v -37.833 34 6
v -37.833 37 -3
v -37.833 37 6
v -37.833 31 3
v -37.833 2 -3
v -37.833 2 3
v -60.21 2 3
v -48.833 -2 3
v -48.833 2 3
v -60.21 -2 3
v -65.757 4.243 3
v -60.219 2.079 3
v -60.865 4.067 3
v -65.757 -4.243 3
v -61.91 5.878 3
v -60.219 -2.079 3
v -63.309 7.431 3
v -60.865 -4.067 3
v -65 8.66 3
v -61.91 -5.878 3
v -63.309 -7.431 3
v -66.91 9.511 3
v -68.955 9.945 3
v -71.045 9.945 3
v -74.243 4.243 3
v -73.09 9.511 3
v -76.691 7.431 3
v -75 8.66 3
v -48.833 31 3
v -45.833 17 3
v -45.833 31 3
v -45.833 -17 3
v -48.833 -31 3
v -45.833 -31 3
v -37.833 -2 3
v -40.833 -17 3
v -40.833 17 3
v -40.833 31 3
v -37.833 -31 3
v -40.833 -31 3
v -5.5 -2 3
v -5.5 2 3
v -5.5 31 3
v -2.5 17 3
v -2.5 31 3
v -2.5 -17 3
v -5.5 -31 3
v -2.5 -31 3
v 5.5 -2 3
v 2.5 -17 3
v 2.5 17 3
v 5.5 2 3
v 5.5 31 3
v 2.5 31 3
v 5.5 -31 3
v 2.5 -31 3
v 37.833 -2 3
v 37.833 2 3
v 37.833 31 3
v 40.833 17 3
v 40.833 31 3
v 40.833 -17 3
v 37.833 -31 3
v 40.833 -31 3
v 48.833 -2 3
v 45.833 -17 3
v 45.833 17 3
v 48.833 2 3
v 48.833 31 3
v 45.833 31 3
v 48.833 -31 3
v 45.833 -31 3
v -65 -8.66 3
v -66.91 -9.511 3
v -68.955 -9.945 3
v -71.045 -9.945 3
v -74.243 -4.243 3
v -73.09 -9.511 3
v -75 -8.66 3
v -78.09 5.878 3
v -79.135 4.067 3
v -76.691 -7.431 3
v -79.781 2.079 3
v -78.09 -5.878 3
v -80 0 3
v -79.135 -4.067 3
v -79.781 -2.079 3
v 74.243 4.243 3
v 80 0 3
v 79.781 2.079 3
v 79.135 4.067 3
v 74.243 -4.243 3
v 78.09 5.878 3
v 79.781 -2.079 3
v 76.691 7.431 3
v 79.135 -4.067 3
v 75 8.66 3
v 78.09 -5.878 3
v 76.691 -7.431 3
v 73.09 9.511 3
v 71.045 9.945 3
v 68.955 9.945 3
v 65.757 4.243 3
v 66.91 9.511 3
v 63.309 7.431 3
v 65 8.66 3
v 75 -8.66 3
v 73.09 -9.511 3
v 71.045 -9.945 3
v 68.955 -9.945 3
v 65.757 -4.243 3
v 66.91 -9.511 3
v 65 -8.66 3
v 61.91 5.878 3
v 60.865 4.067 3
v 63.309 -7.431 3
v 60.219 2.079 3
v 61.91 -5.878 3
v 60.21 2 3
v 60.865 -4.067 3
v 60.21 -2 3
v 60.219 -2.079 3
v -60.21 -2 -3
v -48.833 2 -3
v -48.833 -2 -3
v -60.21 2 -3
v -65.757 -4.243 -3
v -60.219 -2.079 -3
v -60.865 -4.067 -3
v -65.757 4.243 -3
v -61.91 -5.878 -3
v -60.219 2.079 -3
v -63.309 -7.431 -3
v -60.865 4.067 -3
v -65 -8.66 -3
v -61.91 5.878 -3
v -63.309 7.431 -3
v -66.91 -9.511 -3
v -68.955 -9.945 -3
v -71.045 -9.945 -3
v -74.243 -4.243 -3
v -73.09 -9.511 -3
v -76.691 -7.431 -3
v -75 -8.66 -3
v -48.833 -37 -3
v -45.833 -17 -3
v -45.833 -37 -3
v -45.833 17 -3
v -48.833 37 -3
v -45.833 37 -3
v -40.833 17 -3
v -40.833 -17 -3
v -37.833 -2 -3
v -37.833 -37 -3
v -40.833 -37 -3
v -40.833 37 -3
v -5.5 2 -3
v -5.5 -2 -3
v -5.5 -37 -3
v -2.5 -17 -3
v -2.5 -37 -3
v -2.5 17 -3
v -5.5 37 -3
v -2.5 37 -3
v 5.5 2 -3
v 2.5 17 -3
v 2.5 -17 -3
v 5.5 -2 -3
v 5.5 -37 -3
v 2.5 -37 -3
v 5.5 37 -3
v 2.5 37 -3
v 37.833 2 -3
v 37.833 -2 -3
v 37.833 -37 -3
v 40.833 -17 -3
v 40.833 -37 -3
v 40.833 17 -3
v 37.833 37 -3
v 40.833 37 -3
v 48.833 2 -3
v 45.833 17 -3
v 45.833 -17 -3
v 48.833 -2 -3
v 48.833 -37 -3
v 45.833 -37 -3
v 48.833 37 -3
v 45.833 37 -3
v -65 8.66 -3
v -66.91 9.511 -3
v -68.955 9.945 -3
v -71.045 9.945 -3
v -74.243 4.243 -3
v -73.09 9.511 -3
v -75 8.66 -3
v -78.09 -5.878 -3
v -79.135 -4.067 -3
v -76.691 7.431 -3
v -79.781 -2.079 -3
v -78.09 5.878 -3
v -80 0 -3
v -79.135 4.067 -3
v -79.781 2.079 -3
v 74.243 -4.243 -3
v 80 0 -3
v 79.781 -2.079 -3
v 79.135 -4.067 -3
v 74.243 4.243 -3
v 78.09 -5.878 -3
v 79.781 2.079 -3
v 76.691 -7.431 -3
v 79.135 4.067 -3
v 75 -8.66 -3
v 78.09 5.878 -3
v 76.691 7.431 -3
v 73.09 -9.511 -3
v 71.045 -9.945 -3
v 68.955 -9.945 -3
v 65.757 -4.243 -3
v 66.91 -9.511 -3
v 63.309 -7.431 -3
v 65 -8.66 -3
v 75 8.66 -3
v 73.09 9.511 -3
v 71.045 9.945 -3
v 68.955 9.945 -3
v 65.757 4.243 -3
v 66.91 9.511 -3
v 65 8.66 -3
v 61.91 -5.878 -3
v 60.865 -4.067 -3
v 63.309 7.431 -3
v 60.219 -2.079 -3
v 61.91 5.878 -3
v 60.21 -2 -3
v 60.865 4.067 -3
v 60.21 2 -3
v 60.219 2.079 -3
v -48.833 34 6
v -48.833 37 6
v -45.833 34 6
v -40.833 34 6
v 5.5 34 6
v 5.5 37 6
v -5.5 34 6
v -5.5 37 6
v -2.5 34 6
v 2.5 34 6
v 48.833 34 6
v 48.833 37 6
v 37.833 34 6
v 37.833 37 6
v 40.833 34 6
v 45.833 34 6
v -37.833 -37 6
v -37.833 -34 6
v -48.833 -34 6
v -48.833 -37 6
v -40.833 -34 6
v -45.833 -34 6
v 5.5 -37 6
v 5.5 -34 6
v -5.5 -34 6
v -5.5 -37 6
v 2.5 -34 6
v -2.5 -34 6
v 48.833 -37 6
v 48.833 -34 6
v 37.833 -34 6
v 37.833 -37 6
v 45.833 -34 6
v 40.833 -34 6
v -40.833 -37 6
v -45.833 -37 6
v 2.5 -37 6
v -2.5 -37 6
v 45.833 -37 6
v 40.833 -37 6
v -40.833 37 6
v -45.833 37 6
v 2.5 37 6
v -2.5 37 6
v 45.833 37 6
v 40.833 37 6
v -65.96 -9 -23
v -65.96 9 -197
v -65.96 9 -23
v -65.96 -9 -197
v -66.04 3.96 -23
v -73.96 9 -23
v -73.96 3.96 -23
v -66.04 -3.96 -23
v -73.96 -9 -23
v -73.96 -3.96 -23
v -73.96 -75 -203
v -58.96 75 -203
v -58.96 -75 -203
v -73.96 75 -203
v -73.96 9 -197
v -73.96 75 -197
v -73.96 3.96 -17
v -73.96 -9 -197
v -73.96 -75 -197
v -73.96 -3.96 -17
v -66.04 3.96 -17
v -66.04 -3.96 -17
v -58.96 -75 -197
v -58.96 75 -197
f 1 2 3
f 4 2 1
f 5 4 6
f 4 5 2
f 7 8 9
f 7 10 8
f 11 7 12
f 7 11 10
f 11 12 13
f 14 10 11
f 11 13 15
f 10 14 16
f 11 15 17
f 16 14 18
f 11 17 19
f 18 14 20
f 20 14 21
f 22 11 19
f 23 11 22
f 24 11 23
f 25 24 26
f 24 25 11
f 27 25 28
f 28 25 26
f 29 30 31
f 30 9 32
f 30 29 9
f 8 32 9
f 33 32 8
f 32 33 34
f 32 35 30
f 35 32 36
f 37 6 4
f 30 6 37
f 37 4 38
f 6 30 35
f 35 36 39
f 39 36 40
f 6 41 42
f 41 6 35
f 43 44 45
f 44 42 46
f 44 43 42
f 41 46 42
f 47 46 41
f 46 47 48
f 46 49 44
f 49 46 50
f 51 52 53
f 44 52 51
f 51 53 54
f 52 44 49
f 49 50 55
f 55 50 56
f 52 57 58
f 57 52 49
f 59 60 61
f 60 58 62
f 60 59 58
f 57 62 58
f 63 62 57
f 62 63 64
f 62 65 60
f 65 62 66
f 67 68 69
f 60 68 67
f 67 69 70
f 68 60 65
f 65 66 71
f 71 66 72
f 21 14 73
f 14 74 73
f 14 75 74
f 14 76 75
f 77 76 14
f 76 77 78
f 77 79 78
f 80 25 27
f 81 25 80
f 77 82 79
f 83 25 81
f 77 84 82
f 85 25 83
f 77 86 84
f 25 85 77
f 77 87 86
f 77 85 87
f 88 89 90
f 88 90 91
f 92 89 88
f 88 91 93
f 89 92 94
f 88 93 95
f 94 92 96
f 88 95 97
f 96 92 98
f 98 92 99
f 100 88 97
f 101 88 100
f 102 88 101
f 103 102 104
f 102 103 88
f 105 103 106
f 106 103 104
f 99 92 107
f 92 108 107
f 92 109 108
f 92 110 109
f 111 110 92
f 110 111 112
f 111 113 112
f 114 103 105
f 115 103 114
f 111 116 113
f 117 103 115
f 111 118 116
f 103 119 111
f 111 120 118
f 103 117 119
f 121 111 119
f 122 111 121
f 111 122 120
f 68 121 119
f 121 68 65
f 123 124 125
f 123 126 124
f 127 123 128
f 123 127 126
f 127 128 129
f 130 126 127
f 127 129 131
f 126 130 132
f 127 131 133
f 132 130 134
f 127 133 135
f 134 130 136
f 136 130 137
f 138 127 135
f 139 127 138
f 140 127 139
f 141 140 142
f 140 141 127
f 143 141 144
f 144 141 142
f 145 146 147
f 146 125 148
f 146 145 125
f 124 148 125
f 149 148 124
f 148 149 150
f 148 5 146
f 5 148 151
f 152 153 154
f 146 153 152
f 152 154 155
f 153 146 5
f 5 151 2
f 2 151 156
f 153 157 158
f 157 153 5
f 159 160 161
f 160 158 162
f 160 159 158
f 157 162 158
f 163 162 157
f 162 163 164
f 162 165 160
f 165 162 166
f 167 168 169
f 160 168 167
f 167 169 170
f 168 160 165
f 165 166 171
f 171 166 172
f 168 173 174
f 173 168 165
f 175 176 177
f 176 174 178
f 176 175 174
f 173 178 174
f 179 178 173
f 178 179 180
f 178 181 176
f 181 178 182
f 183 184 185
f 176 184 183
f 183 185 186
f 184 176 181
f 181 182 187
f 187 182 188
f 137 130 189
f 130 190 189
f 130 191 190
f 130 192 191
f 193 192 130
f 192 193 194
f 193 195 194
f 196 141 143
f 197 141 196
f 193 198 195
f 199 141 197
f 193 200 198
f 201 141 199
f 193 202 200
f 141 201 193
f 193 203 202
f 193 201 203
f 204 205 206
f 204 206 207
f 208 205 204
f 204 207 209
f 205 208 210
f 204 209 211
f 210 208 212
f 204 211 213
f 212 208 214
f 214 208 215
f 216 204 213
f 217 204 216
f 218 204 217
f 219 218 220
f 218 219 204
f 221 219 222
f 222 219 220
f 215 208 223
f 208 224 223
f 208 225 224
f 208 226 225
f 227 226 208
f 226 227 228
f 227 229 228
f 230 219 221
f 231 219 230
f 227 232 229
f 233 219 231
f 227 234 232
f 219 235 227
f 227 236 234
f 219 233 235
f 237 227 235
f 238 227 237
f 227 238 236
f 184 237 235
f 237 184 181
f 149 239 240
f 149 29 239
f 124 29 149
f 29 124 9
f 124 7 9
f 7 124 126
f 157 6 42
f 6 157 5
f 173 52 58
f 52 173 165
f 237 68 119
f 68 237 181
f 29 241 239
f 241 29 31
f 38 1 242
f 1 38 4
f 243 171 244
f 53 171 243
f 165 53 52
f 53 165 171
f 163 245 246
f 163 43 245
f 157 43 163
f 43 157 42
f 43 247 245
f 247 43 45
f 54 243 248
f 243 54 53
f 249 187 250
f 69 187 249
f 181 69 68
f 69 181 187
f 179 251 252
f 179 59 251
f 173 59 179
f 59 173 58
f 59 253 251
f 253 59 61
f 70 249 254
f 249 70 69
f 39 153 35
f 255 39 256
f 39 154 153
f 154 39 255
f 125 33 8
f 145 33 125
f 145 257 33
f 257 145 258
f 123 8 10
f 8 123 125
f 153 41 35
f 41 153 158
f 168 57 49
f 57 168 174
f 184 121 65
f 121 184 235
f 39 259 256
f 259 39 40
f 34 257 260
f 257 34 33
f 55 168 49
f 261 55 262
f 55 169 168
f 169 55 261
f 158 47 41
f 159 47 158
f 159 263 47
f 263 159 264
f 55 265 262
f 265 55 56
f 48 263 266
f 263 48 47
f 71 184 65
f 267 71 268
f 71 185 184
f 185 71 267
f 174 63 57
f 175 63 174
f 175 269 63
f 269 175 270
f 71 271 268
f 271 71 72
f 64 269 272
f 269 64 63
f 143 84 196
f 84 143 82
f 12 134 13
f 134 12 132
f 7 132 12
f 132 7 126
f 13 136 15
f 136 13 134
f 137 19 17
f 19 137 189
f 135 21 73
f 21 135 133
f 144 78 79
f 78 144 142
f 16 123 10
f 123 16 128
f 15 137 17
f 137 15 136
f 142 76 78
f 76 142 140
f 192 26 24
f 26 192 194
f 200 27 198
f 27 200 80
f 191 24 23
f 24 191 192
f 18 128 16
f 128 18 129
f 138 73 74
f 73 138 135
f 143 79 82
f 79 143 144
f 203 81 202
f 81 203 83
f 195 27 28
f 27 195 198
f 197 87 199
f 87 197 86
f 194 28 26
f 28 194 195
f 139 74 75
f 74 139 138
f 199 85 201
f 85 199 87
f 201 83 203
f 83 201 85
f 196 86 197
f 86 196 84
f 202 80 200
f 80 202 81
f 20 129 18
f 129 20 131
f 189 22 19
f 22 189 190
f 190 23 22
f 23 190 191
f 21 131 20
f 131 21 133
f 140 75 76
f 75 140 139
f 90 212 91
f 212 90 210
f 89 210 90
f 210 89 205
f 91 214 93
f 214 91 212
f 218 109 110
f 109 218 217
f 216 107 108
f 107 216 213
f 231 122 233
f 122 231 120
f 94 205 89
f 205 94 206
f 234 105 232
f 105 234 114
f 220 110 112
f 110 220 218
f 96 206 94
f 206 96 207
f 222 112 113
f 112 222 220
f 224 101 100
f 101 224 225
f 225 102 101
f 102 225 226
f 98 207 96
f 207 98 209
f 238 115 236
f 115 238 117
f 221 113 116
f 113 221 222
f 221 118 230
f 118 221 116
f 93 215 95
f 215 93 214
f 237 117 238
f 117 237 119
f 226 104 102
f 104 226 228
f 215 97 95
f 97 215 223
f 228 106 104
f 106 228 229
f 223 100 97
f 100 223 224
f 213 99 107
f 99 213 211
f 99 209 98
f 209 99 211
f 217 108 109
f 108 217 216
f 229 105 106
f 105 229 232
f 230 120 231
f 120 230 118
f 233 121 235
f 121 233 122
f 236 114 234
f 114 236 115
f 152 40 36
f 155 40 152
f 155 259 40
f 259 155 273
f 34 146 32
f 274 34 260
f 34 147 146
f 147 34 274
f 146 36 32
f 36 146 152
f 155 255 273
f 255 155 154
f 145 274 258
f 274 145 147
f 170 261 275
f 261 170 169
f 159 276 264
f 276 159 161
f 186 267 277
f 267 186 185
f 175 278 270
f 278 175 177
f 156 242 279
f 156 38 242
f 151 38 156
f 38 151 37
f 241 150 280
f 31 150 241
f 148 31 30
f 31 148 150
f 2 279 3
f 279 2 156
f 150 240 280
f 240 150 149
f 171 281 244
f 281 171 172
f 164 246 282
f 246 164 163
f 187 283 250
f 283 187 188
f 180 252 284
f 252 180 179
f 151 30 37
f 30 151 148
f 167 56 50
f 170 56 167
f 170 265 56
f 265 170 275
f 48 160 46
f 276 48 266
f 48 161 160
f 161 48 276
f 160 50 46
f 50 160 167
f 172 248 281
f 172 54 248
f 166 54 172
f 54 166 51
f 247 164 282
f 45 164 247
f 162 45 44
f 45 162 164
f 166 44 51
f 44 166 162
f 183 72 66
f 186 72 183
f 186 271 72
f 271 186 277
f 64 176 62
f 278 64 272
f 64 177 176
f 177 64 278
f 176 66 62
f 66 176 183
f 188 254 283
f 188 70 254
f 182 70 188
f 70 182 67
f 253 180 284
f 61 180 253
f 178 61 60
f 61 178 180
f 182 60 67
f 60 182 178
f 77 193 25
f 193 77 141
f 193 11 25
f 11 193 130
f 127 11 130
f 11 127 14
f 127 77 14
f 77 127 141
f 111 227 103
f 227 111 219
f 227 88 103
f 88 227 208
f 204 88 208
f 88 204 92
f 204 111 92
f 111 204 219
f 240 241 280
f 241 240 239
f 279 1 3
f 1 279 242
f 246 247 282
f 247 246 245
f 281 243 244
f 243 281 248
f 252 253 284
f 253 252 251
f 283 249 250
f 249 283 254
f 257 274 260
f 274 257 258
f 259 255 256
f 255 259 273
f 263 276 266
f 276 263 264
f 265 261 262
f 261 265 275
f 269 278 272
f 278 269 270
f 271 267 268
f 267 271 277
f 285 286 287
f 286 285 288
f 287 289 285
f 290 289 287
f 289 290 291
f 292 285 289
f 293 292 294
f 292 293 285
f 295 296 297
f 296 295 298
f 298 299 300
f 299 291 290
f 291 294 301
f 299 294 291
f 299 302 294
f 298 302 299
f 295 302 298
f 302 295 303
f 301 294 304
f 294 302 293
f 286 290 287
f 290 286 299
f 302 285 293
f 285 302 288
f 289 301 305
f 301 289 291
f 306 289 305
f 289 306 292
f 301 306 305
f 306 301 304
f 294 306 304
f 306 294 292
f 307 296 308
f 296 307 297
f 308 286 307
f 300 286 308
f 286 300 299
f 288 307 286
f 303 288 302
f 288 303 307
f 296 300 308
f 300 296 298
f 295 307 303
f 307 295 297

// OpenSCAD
// [FL_INDEX: keywords="openscad, 3d_parametric, Rack_for_Biropettes__Customizable, csg_solid" | COT="Parametric OpenSCAD design from 3DCodeverse"]
// Title: Rack for Biropettes, Customizable

/// ///
/// PIPETTE RACK v1; 2014 02 24 ///
/// by Tom Baden (thingyverse ID: tbaden) ///
/// thomas.baden@uni-tuebingen.de ///
/// tombaden.wordpress.com ///
/// ///

/////////////////////////////////////////////////////////////////////////////////


// CUSTOMIZABLE VARIABLES
1_or_2_sided = 2; // [1,2]
// (will automatically adjust #slots..)
Length = 130; // [50:300]
Height = 180; //[150:220]

Foot_Y = 150; // [100:200]
Foot_X = 15; // [10:30]
// how thick are all the pieces? - multiplyer
Stability = 2; // [1:4]
// (printer precision)
Tolerance = 0.4; // [0.1, 0.2, 0.3, 0.4, 0.5]
///////////////////////////////////////////////////////////////////////////////////////
///////////////////////////////////////////////////////////////////////////////////////
/// CUSTOMIZER CUTOFF: MODIFY ANYTHING BELOW HERE AT YOUR OWN RISK! ///////////////////
module customizer_cutoff(){};//////////////////////////////////////////////////////////
///////////////////////////////////////////////////////////////////////////////////////

sep = 20;

X = Length;
Z = Height;
Y = 18;

Wall_Y = 2*Stability;
Wall_Z = 3*Stability;
Wall_X = 4*Stability;


X_hanger = 11;
Y_hanger = 35;

slot_depth = 20;
slot_width = 5;

Foot_length = Foot_X;
Foot_width = Foot_Y;

R_end = 10;
R_end_inner = 6;
R_end_inner_minus = R_end_inner-Tolerance;
connect_width = sqrt(R_end_inner_minus*R_end_inner_minus*2);


Triangle_top = 30;

n_slots = round(X/50);

2_sided = 1_or_2_sided-1;

/////////////////// TOP (A)

module A(){
	cube([X,Wall_Y,Wall_Z], center = true ); // main beam
	translate([-X/2-R_end/2,0,0]){cylinder(r = R_end, h = Wall_Z, center = true );} // ends
	translate([X/2+R_end/2,0,0]){cylinder(r = R_end, h = Wall_Z, center = true );} // ends
	for (i = [1:n_slots]) { // protrusion 
		translate([-X/2+(i-0.5)*X/n_slots,-Y_hanger/2-Wall_Y/2,0]){cube([X_hanger,Y_hanger,Wall_Z], center = true );} // main
		translate([-X/2+(i-0.5)*X/n_slots,-Y_hanger-Wall_Y/2,Wall_Z/2]){rotate([45,0,0]){ cube([X_hanger,sqrt(2*(Wall_Z*Wall_Z)),sqrt(2*(Wall_Z*Wall_Z))], center = true );}} // slope

		if (2_sided == 1) {	
			translate([-X/2+(i-0.5)*X/n_slots,Y_hanger/2+Wall_Y/2,0]){cube([X_hanger,Y_hanger,Wall_Z], center = true );} 
		translate([-X/2+(i-0.5)*X/n_slots,+Y_hanger+Wall_Y/2,Wall_Z/2]){rotate([45,0,0]){ cube([X_hanger,sqrt(2*(Wall_Z*Wall_Z)),sqrt(2*(Wall_Z*Wall_Z))], center = true );}} // slope
		}
	}	
}
module A_sub(){
	translate([-X/2-R_end/2,0,0]){rotate([0,0,45]){
		cylinder($fn = 4, r = R_end_inner, h = Wall_Z, center = true );}} // end-hole
	translate([X/2+R_end/2,0,0]){rotate([0,0,45]){
		cylinder($fn = 4, r = R_end_inner, h = Wall_Z, center = true );}} // end-hole

	for (i = [1:n_slots]) { // slots
		translate([-X/2+(i-0.5)*X/n_slots,slot_depth/2-Y_hanger-Wall_Y/2,Wall_Z/2]){cube([slot_width,slot_depth,Wall_Z*2], center = true );}
		if (2_sided == 1) {
			translate([-X/2+(i-0.5)*X/n_slots,-slot_depth/2+Y_hanger+Wall_Y/2,Wall_Z/2]){cube([slot_width,slot_depth,Wall_Z*2], center = true);	}}
	}

	translate([0,-Y_hanger-Wall_Y*1.5,Wall_Z/2]){cube([X,Wall_Y*2,Wall_Z*2], center = true );} // Cut ends
	translate([0,Y_hanger+Wall_Y*1.5,Wall_Z/2]){cube([X,Wall_Y*2,Wall_Z*2], center = true );} // Cut ends
	translate([0,0,Wall_Z*1.5]){cube([X,(Y_hanger+Wall_Y)*2,Wall_Z], center = true );} // Cut top
}
difference(){A();A_sub();}

/////////////////// SIDE (B)



module B(){
	translate([-X/2-R_end/2-connect_width/2+Wall_X/2,0,-Z/2-Wall_Z/2-sep]){cube([Wall_X,Y,Z], center = true );} // main beam
	translate([-X/2-R_end/2,0,-sep]){rotate([0,0,45]){
		cylinder($fn = 4, r = R_end_inner_minus, h = Wall_Z, center = true );}} // connect_thingy
	translate([-X/2-R_end/2-connect_width/2+Foot_length/2,0,-Z-sep]){cube([Foot_length,Foot_width,Wall_Z], center = true );} // foot
//	translate([-X/2-R_end/2-connect_width/2+Wall_X/2,0,-sep-connect_width/2]){rotate([0,45,0]){cube([Triangle_top,Wall_Y,Triangle_top], center = true );}} // triangle
}
module B_sub(){

}
difference(){B();B_sub();}
